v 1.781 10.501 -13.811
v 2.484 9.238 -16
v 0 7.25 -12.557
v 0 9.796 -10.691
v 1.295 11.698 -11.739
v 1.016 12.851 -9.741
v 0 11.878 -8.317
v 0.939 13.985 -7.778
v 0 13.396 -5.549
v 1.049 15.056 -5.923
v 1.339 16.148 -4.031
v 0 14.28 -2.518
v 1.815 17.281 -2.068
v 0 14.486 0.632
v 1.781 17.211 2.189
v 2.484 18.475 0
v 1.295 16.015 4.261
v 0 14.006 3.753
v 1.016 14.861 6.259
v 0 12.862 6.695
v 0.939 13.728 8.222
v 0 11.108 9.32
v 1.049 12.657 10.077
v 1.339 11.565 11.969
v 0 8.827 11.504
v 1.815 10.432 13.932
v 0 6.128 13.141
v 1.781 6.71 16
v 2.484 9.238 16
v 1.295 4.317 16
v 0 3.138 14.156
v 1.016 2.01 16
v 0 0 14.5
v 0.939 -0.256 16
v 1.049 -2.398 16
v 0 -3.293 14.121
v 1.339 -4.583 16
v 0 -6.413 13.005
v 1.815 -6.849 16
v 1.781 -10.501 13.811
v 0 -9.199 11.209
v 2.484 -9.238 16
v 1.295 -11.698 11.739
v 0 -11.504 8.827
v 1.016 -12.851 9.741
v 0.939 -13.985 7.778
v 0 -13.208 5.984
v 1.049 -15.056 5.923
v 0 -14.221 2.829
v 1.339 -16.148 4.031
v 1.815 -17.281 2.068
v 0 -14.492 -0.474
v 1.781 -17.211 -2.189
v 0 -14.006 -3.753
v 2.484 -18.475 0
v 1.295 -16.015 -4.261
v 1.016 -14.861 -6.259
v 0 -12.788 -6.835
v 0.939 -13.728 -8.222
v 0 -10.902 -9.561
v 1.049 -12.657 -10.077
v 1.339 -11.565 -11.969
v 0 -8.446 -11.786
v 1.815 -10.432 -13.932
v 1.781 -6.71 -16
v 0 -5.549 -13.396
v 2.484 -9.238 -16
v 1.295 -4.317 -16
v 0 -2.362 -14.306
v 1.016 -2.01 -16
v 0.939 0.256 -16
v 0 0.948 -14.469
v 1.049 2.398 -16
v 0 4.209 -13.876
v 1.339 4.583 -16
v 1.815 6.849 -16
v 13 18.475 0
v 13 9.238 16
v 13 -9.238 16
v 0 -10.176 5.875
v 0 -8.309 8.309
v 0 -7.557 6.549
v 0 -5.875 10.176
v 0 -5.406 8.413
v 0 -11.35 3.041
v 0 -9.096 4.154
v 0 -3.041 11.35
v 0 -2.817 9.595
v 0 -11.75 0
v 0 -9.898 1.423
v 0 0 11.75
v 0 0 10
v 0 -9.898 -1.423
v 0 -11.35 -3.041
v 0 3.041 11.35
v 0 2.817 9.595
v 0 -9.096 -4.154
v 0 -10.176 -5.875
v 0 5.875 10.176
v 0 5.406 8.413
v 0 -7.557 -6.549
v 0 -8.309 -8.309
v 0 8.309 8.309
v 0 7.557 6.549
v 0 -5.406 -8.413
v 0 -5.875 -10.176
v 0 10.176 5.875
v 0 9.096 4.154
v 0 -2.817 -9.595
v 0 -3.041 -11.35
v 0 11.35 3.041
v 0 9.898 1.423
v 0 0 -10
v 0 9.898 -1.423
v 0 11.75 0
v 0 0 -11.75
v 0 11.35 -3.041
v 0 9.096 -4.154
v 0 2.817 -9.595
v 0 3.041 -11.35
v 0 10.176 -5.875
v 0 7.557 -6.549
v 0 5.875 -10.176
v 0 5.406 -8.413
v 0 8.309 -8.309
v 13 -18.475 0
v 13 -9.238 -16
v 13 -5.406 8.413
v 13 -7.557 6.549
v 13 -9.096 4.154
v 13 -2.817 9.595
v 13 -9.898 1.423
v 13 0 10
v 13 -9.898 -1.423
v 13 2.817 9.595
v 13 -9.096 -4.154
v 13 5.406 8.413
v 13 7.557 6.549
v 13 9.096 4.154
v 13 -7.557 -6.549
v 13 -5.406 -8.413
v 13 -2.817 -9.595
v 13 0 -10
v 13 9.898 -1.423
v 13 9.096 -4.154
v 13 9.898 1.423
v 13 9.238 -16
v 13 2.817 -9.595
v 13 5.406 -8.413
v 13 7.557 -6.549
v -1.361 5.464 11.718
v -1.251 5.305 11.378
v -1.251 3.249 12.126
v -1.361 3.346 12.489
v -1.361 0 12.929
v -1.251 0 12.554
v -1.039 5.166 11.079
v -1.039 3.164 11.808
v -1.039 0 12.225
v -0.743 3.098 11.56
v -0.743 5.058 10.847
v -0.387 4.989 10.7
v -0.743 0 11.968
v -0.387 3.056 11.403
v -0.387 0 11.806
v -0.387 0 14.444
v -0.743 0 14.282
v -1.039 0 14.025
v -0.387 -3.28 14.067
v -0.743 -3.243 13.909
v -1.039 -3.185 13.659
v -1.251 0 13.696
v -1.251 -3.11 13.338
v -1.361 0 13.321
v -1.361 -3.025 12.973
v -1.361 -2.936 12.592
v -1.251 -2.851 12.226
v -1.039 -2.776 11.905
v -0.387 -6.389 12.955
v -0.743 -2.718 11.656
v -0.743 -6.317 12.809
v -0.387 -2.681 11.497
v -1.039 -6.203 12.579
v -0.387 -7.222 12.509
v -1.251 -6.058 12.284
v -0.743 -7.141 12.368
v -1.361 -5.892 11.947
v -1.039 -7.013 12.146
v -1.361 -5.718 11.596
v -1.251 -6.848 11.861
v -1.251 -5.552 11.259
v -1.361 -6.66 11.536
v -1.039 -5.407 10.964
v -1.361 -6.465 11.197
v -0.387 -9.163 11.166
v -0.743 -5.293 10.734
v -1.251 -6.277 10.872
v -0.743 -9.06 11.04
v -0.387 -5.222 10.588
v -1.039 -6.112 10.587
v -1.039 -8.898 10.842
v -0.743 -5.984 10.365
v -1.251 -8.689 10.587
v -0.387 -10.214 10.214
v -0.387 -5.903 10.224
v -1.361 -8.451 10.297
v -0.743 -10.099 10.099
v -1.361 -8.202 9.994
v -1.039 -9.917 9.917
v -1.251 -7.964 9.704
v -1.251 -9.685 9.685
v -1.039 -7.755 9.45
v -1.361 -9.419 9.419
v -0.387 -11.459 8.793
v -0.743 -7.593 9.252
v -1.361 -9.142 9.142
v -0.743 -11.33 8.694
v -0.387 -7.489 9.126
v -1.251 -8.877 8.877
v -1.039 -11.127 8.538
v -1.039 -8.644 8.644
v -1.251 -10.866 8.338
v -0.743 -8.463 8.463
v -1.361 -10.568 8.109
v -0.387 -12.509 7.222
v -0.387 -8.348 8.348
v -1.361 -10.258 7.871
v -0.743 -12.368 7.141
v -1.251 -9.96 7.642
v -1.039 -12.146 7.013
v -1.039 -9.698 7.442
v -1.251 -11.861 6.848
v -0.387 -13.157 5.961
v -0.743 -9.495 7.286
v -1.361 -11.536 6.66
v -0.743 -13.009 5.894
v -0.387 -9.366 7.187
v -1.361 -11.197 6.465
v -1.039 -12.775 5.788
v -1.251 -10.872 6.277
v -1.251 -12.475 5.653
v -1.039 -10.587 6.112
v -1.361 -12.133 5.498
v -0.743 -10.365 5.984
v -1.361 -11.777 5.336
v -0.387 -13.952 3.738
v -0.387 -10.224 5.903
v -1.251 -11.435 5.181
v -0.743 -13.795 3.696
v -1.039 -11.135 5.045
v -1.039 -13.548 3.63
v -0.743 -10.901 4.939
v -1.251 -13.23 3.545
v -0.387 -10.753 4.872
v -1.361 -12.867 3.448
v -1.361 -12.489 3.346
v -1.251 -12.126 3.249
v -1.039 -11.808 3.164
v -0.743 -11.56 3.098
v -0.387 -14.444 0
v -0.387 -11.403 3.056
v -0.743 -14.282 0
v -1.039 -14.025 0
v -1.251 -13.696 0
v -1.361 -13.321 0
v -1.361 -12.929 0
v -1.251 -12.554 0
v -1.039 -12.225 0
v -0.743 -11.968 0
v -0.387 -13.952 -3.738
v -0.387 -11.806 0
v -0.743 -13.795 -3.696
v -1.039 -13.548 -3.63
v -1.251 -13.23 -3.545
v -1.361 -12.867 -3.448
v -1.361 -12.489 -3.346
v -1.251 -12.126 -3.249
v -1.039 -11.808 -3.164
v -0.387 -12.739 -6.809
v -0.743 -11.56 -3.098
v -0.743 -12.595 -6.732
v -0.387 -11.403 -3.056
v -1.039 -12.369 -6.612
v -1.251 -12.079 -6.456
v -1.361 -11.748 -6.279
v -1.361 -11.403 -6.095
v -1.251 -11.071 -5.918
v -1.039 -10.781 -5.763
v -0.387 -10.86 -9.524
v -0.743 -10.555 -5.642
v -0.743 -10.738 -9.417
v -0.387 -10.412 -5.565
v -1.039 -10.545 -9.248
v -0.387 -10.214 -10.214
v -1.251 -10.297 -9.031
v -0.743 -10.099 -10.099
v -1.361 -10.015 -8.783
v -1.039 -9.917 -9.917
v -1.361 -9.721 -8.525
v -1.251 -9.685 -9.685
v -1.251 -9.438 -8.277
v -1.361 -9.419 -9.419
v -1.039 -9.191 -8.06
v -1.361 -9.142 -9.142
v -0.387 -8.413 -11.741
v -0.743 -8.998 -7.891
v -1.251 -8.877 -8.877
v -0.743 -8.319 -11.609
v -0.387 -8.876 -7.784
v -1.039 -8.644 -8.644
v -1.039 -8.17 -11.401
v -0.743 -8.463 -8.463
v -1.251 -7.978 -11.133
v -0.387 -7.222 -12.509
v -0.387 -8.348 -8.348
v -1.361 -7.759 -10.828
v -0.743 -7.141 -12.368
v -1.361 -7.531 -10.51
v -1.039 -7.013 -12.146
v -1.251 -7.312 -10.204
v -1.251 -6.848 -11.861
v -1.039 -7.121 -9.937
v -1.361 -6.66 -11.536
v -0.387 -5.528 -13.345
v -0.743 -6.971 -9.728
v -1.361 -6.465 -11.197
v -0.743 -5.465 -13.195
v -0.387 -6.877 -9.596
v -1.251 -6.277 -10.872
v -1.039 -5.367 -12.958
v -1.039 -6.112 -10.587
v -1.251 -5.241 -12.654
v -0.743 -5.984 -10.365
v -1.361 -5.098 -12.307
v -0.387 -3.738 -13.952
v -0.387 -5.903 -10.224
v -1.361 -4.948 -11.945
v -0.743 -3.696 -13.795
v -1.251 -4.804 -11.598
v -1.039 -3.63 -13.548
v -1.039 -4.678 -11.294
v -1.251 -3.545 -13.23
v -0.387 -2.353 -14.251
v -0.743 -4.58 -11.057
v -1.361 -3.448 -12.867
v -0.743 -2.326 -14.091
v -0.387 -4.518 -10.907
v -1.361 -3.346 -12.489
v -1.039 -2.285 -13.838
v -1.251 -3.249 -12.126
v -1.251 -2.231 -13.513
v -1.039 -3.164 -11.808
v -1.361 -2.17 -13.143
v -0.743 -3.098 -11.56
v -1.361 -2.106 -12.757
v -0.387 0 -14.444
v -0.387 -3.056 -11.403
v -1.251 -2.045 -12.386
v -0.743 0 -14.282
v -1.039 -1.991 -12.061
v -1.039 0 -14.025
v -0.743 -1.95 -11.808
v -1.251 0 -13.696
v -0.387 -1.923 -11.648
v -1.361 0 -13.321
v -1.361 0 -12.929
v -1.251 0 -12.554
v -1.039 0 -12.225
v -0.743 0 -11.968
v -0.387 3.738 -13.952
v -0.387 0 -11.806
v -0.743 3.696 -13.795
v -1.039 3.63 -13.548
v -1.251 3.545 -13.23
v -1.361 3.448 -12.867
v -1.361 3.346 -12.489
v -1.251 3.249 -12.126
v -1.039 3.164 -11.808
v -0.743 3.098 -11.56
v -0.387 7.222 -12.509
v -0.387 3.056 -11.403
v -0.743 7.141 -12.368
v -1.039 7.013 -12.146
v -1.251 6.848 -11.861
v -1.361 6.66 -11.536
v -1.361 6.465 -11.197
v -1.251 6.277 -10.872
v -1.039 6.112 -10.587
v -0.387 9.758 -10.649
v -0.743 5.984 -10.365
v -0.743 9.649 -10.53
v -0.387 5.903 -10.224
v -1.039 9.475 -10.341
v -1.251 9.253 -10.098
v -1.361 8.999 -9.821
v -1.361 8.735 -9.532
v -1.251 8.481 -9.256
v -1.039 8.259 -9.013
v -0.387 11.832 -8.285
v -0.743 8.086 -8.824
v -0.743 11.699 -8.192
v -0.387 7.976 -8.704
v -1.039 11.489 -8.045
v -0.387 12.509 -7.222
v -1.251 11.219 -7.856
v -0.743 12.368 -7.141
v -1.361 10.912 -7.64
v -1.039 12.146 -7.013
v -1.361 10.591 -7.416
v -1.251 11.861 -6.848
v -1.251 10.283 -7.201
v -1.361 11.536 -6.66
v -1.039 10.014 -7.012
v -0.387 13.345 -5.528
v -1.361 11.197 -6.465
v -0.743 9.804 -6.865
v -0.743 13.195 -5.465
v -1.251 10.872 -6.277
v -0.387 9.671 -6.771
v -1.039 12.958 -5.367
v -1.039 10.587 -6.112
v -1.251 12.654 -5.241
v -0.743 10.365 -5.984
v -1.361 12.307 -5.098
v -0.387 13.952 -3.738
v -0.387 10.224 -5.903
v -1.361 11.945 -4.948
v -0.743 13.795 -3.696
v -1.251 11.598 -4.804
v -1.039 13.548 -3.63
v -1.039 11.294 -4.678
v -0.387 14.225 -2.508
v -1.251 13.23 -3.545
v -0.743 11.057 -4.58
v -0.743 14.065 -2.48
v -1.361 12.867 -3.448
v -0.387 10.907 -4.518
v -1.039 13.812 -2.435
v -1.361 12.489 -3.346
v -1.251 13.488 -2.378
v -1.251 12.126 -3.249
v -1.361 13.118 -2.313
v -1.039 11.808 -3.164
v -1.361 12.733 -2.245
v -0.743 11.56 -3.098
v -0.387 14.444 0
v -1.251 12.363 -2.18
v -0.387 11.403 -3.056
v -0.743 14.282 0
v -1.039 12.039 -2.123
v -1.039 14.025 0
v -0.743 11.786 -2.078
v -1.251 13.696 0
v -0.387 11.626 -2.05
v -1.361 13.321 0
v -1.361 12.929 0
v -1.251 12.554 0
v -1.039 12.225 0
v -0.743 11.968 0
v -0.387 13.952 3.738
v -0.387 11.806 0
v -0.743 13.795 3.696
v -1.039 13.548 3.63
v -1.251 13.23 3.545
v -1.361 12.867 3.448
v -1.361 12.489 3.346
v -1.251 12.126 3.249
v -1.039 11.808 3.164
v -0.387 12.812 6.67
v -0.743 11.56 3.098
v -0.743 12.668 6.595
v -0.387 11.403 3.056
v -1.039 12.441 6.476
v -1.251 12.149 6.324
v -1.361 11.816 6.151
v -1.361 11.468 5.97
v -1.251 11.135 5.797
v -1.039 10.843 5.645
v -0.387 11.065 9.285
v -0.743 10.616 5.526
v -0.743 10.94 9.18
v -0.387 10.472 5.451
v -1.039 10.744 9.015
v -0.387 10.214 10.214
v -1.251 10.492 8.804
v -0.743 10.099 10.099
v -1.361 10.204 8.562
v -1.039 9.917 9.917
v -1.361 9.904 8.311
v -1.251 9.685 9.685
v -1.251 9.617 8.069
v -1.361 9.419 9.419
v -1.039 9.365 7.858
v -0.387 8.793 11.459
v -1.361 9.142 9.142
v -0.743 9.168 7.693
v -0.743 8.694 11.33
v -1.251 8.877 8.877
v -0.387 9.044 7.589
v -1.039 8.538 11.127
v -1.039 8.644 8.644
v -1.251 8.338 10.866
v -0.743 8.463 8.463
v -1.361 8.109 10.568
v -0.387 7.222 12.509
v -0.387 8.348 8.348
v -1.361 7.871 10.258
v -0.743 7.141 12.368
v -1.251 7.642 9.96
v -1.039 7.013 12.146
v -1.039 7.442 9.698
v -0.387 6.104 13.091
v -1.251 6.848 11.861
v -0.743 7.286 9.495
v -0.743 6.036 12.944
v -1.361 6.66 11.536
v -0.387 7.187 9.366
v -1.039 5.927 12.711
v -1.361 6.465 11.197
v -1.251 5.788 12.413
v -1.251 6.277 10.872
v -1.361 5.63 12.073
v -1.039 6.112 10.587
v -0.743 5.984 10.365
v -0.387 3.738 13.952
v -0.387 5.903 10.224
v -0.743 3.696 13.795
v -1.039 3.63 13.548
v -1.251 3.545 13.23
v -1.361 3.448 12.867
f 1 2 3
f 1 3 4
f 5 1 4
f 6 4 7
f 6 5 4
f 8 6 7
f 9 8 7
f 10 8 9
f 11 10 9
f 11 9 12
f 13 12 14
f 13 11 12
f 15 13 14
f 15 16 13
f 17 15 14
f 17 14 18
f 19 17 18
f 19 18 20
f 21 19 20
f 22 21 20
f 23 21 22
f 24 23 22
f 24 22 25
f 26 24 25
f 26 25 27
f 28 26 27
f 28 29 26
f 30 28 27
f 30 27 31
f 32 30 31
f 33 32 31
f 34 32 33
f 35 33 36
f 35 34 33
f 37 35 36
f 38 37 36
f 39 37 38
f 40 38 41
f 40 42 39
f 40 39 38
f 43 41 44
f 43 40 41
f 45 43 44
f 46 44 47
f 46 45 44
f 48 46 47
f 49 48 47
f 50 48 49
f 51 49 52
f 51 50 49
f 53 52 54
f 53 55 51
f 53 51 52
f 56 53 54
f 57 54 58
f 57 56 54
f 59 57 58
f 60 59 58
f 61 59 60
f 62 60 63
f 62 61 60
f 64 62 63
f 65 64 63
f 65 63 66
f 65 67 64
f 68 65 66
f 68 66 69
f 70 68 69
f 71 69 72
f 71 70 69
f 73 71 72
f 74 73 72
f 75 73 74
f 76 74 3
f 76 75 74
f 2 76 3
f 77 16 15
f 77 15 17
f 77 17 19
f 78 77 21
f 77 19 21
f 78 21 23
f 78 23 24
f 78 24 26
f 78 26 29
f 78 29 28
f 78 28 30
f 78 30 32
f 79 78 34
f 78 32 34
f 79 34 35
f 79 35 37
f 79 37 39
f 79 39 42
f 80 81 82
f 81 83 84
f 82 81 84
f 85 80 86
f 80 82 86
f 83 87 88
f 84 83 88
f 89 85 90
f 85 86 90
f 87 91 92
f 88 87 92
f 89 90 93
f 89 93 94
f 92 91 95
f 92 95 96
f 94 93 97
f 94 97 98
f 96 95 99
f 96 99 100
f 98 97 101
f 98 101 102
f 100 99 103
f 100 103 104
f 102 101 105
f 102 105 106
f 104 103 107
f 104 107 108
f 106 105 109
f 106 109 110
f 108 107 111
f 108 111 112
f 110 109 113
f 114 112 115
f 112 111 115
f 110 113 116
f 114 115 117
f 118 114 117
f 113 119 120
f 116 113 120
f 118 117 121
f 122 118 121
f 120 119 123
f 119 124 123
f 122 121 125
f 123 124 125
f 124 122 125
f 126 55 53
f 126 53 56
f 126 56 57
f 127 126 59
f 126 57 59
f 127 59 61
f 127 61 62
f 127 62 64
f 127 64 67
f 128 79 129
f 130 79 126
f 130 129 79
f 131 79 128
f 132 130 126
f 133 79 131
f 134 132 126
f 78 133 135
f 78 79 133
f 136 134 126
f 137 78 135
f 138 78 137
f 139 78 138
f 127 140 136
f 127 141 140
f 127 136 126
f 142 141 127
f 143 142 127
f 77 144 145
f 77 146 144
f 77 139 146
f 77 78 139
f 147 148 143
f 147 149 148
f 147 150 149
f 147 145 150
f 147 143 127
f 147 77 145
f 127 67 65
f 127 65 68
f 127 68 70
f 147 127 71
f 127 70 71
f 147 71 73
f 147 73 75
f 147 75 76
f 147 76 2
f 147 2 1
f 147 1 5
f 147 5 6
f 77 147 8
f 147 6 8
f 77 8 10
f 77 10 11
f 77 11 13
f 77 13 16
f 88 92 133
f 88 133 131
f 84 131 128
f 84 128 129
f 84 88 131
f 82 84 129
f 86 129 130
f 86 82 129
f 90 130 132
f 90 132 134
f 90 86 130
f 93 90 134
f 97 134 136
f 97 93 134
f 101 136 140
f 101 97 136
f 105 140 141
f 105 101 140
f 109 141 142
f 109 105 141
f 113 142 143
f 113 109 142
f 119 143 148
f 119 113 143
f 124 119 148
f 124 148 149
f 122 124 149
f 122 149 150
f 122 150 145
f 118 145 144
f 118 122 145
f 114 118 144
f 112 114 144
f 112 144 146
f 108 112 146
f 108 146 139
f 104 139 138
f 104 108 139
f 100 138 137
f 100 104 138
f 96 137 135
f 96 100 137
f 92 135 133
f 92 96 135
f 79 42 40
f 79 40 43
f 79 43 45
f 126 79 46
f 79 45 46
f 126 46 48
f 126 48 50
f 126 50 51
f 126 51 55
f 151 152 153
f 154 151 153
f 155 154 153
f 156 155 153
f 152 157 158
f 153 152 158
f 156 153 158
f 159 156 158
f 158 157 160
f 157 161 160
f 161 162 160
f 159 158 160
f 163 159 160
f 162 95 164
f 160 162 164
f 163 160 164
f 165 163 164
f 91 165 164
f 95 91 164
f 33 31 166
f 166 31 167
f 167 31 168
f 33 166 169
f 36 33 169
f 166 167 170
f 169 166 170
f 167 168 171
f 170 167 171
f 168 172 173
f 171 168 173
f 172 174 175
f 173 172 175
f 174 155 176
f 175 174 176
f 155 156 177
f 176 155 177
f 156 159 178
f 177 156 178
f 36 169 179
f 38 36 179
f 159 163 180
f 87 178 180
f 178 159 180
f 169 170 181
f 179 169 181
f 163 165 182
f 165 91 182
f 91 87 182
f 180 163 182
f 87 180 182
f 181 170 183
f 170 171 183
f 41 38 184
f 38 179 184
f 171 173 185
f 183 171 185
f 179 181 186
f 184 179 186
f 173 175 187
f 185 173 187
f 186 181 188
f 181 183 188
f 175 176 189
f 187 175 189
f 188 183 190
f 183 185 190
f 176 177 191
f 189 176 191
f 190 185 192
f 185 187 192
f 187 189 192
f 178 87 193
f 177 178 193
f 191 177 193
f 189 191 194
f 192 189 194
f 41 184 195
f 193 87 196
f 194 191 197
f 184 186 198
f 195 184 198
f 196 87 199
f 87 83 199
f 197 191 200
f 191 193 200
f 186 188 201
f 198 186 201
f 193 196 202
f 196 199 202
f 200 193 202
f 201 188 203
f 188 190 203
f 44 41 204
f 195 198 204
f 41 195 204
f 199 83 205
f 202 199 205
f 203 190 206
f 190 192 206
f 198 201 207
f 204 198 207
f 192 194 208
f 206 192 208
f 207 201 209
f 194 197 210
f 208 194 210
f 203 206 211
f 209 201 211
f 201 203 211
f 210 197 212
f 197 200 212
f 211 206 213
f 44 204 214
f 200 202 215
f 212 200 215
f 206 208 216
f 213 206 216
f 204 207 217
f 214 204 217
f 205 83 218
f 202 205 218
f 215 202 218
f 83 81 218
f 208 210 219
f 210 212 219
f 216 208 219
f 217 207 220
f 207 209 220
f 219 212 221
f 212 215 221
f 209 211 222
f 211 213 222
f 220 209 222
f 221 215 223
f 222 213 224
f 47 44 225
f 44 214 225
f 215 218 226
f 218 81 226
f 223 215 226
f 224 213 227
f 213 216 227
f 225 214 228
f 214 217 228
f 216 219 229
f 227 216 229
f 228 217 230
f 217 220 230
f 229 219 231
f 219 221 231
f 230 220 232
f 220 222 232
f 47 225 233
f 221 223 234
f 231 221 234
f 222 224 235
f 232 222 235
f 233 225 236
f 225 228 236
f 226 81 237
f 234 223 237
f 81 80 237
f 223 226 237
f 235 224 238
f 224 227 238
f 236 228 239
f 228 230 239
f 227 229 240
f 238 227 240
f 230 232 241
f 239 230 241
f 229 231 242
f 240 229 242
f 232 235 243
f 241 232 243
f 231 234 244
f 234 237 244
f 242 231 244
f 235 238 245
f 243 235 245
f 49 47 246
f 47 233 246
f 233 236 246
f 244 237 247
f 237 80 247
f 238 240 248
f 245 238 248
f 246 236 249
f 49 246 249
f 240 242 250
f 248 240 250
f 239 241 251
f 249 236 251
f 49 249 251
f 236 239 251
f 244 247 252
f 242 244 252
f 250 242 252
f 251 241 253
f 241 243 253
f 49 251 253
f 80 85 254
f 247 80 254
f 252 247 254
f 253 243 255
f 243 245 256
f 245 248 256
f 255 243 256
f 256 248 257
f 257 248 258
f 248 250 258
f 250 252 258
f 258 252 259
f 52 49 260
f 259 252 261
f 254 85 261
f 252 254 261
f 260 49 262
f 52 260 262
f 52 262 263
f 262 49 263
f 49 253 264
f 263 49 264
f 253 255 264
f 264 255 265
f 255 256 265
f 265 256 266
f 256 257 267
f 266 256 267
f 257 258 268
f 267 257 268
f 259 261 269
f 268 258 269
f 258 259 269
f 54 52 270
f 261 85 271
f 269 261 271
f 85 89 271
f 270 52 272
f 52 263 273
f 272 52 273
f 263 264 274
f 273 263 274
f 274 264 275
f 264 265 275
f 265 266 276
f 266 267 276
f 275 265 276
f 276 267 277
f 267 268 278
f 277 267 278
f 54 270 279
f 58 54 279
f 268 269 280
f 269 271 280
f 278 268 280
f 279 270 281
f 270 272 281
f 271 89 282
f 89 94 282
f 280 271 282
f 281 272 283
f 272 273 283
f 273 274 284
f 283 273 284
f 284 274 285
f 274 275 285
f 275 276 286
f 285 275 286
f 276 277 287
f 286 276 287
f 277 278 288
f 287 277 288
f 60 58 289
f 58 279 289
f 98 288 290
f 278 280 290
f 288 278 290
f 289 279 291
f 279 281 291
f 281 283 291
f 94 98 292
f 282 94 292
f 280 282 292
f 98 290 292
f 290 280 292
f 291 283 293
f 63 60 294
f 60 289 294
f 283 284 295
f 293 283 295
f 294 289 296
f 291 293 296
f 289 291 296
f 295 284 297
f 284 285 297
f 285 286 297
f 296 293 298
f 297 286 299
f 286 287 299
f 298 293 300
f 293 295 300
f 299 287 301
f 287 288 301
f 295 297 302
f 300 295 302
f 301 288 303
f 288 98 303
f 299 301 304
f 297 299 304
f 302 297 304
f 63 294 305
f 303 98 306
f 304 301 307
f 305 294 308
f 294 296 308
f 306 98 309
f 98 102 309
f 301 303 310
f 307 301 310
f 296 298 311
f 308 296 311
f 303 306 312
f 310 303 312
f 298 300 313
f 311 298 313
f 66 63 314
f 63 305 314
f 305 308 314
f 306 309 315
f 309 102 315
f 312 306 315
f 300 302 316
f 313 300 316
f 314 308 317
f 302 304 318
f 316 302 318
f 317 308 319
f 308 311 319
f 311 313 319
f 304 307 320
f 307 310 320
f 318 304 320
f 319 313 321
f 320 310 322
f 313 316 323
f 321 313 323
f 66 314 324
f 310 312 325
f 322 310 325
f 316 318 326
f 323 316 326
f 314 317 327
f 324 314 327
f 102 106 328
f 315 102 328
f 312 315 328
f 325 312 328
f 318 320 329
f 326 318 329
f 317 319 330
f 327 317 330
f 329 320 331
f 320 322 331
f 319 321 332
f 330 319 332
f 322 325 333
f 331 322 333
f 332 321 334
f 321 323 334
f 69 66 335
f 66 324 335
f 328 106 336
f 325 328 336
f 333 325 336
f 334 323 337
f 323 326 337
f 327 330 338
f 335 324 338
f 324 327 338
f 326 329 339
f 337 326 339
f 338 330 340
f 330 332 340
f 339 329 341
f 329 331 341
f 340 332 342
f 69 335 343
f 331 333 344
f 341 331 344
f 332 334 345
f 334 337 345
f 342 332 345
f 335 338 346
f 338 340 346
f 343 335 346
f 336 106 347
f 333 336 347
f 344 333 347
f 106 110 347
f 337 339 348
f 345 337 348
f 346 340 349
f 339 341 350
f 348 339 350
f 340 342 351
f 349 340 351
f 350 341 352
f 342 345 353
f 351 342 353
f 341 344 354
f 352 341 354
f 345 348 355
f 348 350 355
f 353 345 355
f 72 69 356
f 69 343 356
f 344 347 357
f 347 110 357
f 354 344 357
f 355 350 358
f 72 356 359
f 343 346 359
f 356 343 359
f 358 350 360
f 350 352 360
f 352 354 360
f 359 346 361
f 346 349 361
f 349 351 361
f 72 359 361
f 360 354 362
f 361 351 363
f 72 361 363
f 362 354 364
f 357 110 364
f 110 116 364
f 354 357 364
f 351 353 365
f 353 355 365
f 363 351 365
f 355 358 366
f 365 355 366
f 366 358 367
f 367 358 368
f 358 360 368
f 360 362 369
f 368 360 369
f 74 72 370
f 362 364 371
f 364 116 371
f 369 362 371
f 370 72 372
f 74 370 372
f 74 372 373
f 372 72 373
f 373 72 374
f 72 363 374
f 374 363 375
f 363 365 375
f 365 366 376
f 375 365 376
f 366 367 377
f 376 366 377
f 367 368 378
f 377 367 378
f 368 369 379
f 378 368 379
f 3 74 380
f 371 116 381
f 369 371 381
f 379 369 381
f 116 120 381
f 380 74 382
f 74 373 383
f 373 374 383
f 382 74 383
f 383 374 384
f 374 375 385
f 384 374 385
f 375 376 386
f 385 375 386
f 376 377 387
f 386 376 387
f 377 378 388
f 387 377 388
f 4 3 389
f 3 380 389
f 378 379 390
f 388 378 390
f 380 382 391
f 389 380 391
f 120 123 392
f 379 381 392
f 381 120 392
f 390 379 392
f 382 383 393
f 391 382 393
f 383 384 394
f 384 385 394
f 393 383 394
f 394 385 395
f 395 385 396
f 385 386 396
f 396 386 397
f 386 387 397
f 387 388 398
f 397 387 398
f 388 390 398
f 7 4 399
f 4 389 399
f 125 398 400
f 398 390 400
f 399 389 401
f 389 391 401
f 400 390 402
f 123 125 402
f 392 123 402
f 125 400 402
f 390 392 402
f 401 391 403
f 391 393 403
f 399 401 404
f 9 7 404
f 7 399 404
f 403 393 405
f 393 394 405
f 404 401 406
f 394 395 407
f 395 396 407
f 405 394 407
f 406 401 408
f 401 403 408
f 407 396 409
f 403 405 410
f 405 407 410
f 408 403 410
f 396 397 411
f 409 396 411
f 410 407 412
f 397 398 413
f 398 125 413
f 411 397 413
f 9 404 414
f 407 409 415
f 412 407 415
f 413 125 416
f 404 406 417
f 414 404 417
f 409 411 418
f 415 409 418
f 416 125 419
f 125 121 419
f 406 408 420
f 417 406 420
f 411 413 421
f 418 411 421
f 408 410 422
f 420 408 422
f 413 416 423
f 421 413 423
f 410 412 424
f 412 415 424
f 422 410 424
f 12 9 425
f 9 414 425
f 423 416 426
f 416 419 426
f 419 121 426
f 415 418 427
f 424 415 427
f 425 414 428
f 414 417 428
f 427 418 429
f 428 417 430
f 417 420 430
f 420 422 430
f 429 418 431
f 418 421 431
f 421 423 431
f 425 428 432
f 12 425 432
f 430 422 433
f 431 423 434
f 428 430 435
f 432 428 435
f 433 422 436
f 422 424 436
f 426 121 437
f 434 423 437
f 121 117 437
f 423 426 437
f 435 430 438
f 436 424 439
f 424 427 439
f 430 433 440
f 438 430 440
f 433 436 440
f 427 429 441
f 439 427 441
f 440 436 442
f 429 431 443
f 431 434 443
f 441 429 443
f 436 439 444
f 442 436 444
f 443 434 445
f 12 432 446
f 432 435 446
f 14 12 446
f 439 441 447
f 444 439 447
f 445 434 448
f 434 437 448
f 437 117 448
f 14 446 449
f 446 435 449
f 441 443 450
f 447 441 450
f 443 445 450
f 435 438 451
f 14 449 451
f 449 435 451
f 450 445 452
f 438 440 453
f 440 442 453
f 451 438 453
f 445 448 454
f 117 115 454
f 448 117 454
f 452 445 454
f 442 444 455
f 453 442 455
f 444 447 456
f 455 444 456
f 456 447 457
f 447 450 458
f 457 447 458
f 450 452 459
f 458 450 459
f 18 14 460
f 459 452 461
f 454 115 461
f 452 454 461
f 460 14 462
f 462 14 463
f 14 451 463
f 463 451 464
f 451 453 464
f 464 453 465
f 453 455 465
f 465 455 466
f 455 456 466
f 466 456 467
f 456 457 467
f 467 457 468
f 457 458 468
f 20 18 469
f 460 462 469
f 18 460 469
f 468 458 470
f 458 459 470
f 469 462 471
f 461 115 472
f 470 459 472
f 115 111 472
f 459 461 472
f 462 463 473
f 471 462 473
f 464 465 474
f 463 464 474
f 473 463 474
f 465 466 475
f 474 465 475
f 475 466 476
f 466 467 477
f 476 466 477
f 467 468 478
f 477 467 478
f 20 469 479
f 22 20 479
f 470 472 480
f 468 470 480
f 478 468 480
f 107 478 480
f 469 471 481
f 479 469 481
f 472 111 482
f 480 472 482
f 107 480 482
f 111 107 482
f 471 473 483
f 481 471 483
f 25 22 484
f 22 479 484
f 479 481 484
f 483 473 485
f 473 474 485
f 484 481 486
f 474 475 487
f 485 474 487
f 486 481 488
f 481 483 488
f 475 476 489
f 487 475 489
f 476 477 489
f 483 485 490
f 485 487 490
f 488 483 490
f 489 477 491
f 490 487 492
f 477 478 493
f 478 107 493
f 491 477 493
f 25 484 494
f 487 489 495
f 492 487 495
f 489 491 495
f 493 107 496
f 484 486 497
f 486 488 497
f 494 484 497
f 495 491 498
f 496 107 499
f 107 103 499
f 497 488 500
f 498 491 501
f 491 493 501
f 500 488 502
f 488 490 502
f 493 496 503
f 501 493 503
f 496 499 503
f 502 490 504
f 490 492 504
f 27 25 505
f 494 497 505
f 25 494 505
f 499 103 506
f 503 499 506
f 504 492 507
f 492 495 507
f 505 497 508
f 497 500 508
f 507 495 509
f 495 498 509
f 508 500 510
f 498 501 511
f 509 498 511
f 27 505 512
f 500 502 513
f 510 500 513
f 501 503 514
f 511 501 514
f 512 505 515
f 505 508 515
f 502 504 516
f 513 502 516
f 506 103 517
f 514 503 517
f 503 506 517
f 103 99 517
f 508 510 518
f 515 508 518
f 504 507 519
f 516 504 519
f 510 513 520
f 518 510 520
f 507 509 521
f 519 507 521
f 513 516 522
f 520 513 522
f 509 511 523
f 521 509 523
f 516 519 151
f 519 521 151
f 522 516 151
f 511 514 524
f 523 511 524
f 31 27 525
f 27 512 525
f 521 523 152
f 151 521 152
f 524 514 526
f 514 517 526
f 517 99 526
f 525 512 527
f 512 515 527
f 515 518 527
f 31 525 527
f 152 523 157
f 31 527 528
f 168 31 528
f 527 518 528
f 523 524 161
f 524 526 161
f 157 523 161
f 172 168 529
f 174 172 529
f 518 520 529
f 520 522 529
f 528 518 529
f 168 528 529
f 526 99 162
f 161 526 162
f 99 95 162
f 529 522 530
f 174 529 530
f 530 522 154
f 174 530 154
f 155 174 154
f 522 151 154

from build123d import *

# Parameters (mm, degrees)
SKETCH1_R           = 10
BOSS_EXTRUDE1_DEPTH = 13


with BuildPart() as part:
    # Sketch1 → Boss-Extrude1 (new body)
    with BuildSketch(Plane(origin=(0, 0, 0), x_dir=(0, 0, -1), z_dir=(1, 0, 0))):
        Polygon((-16, 9.237604307), (-16, -9.237604307), (0, -18.475208614), (16, -9.237604307), (16, 9.237604307), (0, 18.475208614), align=None)
        with Locations(Location((0, 0, 0), (0, 0, 180))):
            Circle(SKETCH1_R, mode=Mode.SUBTRACT)
    extrude(amount=BOSS_EXTRUDE1_DEPTH)

    # Sketch2 → Cut-Revolve1 (revolve, cut)
    with BuildSketch(Plane(origin=(0, 0, 0), x_dir=(1, 0, 0), z_dir=(0, 1, 0)), mode=Mode.PRIVATE) as cut_revolve1_sk:
        Polygon((0, 14.5), (3.137550133, 19.521191174), (-1.152758785, 19.521191174), (-1.152758785, 14.5), align=None)
    revolve(cut_revolve1_sk.sketch.rotate(Axis((0, 0, 0), (1, 0, 0)), 29.999999997), axis=Axis((0, 0, 0), (1, 0, 0)), mode=Mode.SUBTRACT)

    # Sketch4 → Revolve1 (revolve)
    with BuildSketch(Plane(origin=(0, 0, 0), x_dir=(1, 0, 0), z_dir=(0, 1, 0)), mode=Mode.PRIVATE) as revolve1_sk:
        with BuildLine():
            Line((0, 11.75), (0, 14.5))
            ThreePointArc((0, 14.5), (-1.375, 13.125), (0, 11.75))
        make_face()
    revolve(revolve1_sk.sketch.rotate(Axis((0, 0, 0), (1, 0, 0)), 180), axis=Axis((0, 0, 0), (1, 0, 0)))


solid = part.part
